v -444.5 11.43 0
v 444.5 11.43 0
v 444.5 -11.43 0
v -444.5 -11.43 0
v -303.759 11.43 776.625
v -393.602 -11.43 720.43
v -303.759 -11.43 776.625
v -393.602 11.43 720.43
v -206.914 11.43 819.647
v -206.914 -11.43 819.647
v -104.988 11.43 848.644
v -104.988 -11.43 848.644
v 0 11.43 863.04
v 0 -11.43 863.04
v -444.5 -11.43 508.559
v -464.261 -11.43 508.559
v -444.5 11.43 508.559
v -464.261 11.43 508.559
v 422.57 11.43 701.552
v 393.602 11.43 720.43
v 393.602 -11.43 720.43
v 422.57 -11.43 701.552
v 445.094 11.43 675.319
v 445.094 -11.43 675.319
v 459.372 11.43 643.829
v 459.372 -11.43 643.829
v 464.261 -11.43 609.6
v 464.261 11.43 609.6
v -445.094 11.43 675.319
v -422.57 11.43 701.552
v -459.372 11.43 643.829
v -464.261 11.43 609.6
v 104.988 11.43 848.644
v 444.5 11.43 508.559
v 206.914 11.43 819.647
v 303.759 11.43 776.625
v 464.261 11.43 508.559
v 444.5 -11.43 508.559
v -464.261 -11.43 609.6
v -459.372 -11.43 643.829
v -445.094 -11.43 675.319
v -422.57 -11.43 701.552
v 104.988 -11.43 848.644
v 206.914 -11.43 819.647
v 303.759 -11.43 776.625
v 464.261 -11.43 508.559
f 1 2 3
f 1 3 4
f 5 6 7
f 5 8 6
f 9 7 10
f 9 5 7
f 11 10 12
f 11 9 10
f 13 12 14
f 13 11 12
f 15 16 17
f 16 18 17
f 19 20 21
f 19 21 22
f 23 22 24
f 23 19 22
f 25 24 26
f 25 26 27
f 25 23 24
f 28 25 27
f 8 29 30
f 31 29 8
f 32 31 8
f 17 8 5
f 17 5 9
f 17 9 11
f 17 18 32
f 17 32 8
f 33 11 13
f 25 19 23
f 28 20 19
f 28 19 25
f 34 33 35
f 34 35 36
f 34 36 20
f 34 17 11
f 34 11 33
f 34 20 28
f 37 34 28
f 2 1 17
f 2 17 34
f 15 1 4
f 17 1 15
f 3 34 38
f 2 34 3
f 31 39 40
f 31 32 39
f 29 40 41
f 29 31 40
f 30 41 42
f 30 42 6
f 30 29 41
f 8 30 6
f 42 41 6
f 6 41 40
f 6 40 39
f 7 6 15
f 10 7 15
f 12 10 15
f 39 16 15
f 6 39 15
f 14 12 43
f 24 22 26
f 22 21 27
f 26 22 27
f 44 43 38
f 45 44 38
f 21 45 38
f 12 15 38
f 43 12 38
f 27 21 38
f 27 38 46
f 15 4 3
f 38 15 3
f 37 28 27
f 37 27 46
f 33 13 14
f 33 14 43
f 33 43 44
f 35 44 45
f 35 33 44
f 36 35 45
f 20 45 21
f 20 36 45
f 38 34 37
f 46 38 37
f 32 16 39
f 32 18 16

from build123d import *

# Parameters (mm, degrees)
BOSS_EXTRUDE3_DEPTH = 11.43


with BuildPart() as part:
    # Sketch22 → Boss-Extrude3 (new, symmetric)
    with BuildSketch(Plane(origin=(0, 0, 0), x_dir=(1, 0, 0), z_dir=(0, 1, 0))):
        with BuildLine():
            Line((444.5, 0), (-444.5, 0))
            Line((-444.5, 0), (-444.5, -508.5588))
            Line((-444.5, -508.5588), (-464.2612, -508.5588))
            Line((-464.2612, -508.5588), (-464.2612, -609.6))
            ThreePointArc((-464.2612, -609.6), (-445.093816183, -675.319055068), (-393.602166776, -720.429950012))
            ThreePointArc((-393.602166776, -720.429950012), (-206.914351562, -819.647480117), (0, -863.039988079))
            ThreePointArc((0, -863.039988079), (206.914351562, -819.647480117), (393.602166776, -720.429950012))
            ThreePointArc((393.602166776, -720.429950012), (445.093816183, -675.319055068), (464.2612, -609.6))
            Line((464.2612, -609.6), (464.2612, -508.5588))
            Line((464.2612, -508.5588), (444.5, -508.5588))
            Line((444.5, -508.5588), (444.5, 0))
        make_face()
    extrude(amount=BOSS_EXTRUDE3_DEPTH, both=True)


solid = part.part
